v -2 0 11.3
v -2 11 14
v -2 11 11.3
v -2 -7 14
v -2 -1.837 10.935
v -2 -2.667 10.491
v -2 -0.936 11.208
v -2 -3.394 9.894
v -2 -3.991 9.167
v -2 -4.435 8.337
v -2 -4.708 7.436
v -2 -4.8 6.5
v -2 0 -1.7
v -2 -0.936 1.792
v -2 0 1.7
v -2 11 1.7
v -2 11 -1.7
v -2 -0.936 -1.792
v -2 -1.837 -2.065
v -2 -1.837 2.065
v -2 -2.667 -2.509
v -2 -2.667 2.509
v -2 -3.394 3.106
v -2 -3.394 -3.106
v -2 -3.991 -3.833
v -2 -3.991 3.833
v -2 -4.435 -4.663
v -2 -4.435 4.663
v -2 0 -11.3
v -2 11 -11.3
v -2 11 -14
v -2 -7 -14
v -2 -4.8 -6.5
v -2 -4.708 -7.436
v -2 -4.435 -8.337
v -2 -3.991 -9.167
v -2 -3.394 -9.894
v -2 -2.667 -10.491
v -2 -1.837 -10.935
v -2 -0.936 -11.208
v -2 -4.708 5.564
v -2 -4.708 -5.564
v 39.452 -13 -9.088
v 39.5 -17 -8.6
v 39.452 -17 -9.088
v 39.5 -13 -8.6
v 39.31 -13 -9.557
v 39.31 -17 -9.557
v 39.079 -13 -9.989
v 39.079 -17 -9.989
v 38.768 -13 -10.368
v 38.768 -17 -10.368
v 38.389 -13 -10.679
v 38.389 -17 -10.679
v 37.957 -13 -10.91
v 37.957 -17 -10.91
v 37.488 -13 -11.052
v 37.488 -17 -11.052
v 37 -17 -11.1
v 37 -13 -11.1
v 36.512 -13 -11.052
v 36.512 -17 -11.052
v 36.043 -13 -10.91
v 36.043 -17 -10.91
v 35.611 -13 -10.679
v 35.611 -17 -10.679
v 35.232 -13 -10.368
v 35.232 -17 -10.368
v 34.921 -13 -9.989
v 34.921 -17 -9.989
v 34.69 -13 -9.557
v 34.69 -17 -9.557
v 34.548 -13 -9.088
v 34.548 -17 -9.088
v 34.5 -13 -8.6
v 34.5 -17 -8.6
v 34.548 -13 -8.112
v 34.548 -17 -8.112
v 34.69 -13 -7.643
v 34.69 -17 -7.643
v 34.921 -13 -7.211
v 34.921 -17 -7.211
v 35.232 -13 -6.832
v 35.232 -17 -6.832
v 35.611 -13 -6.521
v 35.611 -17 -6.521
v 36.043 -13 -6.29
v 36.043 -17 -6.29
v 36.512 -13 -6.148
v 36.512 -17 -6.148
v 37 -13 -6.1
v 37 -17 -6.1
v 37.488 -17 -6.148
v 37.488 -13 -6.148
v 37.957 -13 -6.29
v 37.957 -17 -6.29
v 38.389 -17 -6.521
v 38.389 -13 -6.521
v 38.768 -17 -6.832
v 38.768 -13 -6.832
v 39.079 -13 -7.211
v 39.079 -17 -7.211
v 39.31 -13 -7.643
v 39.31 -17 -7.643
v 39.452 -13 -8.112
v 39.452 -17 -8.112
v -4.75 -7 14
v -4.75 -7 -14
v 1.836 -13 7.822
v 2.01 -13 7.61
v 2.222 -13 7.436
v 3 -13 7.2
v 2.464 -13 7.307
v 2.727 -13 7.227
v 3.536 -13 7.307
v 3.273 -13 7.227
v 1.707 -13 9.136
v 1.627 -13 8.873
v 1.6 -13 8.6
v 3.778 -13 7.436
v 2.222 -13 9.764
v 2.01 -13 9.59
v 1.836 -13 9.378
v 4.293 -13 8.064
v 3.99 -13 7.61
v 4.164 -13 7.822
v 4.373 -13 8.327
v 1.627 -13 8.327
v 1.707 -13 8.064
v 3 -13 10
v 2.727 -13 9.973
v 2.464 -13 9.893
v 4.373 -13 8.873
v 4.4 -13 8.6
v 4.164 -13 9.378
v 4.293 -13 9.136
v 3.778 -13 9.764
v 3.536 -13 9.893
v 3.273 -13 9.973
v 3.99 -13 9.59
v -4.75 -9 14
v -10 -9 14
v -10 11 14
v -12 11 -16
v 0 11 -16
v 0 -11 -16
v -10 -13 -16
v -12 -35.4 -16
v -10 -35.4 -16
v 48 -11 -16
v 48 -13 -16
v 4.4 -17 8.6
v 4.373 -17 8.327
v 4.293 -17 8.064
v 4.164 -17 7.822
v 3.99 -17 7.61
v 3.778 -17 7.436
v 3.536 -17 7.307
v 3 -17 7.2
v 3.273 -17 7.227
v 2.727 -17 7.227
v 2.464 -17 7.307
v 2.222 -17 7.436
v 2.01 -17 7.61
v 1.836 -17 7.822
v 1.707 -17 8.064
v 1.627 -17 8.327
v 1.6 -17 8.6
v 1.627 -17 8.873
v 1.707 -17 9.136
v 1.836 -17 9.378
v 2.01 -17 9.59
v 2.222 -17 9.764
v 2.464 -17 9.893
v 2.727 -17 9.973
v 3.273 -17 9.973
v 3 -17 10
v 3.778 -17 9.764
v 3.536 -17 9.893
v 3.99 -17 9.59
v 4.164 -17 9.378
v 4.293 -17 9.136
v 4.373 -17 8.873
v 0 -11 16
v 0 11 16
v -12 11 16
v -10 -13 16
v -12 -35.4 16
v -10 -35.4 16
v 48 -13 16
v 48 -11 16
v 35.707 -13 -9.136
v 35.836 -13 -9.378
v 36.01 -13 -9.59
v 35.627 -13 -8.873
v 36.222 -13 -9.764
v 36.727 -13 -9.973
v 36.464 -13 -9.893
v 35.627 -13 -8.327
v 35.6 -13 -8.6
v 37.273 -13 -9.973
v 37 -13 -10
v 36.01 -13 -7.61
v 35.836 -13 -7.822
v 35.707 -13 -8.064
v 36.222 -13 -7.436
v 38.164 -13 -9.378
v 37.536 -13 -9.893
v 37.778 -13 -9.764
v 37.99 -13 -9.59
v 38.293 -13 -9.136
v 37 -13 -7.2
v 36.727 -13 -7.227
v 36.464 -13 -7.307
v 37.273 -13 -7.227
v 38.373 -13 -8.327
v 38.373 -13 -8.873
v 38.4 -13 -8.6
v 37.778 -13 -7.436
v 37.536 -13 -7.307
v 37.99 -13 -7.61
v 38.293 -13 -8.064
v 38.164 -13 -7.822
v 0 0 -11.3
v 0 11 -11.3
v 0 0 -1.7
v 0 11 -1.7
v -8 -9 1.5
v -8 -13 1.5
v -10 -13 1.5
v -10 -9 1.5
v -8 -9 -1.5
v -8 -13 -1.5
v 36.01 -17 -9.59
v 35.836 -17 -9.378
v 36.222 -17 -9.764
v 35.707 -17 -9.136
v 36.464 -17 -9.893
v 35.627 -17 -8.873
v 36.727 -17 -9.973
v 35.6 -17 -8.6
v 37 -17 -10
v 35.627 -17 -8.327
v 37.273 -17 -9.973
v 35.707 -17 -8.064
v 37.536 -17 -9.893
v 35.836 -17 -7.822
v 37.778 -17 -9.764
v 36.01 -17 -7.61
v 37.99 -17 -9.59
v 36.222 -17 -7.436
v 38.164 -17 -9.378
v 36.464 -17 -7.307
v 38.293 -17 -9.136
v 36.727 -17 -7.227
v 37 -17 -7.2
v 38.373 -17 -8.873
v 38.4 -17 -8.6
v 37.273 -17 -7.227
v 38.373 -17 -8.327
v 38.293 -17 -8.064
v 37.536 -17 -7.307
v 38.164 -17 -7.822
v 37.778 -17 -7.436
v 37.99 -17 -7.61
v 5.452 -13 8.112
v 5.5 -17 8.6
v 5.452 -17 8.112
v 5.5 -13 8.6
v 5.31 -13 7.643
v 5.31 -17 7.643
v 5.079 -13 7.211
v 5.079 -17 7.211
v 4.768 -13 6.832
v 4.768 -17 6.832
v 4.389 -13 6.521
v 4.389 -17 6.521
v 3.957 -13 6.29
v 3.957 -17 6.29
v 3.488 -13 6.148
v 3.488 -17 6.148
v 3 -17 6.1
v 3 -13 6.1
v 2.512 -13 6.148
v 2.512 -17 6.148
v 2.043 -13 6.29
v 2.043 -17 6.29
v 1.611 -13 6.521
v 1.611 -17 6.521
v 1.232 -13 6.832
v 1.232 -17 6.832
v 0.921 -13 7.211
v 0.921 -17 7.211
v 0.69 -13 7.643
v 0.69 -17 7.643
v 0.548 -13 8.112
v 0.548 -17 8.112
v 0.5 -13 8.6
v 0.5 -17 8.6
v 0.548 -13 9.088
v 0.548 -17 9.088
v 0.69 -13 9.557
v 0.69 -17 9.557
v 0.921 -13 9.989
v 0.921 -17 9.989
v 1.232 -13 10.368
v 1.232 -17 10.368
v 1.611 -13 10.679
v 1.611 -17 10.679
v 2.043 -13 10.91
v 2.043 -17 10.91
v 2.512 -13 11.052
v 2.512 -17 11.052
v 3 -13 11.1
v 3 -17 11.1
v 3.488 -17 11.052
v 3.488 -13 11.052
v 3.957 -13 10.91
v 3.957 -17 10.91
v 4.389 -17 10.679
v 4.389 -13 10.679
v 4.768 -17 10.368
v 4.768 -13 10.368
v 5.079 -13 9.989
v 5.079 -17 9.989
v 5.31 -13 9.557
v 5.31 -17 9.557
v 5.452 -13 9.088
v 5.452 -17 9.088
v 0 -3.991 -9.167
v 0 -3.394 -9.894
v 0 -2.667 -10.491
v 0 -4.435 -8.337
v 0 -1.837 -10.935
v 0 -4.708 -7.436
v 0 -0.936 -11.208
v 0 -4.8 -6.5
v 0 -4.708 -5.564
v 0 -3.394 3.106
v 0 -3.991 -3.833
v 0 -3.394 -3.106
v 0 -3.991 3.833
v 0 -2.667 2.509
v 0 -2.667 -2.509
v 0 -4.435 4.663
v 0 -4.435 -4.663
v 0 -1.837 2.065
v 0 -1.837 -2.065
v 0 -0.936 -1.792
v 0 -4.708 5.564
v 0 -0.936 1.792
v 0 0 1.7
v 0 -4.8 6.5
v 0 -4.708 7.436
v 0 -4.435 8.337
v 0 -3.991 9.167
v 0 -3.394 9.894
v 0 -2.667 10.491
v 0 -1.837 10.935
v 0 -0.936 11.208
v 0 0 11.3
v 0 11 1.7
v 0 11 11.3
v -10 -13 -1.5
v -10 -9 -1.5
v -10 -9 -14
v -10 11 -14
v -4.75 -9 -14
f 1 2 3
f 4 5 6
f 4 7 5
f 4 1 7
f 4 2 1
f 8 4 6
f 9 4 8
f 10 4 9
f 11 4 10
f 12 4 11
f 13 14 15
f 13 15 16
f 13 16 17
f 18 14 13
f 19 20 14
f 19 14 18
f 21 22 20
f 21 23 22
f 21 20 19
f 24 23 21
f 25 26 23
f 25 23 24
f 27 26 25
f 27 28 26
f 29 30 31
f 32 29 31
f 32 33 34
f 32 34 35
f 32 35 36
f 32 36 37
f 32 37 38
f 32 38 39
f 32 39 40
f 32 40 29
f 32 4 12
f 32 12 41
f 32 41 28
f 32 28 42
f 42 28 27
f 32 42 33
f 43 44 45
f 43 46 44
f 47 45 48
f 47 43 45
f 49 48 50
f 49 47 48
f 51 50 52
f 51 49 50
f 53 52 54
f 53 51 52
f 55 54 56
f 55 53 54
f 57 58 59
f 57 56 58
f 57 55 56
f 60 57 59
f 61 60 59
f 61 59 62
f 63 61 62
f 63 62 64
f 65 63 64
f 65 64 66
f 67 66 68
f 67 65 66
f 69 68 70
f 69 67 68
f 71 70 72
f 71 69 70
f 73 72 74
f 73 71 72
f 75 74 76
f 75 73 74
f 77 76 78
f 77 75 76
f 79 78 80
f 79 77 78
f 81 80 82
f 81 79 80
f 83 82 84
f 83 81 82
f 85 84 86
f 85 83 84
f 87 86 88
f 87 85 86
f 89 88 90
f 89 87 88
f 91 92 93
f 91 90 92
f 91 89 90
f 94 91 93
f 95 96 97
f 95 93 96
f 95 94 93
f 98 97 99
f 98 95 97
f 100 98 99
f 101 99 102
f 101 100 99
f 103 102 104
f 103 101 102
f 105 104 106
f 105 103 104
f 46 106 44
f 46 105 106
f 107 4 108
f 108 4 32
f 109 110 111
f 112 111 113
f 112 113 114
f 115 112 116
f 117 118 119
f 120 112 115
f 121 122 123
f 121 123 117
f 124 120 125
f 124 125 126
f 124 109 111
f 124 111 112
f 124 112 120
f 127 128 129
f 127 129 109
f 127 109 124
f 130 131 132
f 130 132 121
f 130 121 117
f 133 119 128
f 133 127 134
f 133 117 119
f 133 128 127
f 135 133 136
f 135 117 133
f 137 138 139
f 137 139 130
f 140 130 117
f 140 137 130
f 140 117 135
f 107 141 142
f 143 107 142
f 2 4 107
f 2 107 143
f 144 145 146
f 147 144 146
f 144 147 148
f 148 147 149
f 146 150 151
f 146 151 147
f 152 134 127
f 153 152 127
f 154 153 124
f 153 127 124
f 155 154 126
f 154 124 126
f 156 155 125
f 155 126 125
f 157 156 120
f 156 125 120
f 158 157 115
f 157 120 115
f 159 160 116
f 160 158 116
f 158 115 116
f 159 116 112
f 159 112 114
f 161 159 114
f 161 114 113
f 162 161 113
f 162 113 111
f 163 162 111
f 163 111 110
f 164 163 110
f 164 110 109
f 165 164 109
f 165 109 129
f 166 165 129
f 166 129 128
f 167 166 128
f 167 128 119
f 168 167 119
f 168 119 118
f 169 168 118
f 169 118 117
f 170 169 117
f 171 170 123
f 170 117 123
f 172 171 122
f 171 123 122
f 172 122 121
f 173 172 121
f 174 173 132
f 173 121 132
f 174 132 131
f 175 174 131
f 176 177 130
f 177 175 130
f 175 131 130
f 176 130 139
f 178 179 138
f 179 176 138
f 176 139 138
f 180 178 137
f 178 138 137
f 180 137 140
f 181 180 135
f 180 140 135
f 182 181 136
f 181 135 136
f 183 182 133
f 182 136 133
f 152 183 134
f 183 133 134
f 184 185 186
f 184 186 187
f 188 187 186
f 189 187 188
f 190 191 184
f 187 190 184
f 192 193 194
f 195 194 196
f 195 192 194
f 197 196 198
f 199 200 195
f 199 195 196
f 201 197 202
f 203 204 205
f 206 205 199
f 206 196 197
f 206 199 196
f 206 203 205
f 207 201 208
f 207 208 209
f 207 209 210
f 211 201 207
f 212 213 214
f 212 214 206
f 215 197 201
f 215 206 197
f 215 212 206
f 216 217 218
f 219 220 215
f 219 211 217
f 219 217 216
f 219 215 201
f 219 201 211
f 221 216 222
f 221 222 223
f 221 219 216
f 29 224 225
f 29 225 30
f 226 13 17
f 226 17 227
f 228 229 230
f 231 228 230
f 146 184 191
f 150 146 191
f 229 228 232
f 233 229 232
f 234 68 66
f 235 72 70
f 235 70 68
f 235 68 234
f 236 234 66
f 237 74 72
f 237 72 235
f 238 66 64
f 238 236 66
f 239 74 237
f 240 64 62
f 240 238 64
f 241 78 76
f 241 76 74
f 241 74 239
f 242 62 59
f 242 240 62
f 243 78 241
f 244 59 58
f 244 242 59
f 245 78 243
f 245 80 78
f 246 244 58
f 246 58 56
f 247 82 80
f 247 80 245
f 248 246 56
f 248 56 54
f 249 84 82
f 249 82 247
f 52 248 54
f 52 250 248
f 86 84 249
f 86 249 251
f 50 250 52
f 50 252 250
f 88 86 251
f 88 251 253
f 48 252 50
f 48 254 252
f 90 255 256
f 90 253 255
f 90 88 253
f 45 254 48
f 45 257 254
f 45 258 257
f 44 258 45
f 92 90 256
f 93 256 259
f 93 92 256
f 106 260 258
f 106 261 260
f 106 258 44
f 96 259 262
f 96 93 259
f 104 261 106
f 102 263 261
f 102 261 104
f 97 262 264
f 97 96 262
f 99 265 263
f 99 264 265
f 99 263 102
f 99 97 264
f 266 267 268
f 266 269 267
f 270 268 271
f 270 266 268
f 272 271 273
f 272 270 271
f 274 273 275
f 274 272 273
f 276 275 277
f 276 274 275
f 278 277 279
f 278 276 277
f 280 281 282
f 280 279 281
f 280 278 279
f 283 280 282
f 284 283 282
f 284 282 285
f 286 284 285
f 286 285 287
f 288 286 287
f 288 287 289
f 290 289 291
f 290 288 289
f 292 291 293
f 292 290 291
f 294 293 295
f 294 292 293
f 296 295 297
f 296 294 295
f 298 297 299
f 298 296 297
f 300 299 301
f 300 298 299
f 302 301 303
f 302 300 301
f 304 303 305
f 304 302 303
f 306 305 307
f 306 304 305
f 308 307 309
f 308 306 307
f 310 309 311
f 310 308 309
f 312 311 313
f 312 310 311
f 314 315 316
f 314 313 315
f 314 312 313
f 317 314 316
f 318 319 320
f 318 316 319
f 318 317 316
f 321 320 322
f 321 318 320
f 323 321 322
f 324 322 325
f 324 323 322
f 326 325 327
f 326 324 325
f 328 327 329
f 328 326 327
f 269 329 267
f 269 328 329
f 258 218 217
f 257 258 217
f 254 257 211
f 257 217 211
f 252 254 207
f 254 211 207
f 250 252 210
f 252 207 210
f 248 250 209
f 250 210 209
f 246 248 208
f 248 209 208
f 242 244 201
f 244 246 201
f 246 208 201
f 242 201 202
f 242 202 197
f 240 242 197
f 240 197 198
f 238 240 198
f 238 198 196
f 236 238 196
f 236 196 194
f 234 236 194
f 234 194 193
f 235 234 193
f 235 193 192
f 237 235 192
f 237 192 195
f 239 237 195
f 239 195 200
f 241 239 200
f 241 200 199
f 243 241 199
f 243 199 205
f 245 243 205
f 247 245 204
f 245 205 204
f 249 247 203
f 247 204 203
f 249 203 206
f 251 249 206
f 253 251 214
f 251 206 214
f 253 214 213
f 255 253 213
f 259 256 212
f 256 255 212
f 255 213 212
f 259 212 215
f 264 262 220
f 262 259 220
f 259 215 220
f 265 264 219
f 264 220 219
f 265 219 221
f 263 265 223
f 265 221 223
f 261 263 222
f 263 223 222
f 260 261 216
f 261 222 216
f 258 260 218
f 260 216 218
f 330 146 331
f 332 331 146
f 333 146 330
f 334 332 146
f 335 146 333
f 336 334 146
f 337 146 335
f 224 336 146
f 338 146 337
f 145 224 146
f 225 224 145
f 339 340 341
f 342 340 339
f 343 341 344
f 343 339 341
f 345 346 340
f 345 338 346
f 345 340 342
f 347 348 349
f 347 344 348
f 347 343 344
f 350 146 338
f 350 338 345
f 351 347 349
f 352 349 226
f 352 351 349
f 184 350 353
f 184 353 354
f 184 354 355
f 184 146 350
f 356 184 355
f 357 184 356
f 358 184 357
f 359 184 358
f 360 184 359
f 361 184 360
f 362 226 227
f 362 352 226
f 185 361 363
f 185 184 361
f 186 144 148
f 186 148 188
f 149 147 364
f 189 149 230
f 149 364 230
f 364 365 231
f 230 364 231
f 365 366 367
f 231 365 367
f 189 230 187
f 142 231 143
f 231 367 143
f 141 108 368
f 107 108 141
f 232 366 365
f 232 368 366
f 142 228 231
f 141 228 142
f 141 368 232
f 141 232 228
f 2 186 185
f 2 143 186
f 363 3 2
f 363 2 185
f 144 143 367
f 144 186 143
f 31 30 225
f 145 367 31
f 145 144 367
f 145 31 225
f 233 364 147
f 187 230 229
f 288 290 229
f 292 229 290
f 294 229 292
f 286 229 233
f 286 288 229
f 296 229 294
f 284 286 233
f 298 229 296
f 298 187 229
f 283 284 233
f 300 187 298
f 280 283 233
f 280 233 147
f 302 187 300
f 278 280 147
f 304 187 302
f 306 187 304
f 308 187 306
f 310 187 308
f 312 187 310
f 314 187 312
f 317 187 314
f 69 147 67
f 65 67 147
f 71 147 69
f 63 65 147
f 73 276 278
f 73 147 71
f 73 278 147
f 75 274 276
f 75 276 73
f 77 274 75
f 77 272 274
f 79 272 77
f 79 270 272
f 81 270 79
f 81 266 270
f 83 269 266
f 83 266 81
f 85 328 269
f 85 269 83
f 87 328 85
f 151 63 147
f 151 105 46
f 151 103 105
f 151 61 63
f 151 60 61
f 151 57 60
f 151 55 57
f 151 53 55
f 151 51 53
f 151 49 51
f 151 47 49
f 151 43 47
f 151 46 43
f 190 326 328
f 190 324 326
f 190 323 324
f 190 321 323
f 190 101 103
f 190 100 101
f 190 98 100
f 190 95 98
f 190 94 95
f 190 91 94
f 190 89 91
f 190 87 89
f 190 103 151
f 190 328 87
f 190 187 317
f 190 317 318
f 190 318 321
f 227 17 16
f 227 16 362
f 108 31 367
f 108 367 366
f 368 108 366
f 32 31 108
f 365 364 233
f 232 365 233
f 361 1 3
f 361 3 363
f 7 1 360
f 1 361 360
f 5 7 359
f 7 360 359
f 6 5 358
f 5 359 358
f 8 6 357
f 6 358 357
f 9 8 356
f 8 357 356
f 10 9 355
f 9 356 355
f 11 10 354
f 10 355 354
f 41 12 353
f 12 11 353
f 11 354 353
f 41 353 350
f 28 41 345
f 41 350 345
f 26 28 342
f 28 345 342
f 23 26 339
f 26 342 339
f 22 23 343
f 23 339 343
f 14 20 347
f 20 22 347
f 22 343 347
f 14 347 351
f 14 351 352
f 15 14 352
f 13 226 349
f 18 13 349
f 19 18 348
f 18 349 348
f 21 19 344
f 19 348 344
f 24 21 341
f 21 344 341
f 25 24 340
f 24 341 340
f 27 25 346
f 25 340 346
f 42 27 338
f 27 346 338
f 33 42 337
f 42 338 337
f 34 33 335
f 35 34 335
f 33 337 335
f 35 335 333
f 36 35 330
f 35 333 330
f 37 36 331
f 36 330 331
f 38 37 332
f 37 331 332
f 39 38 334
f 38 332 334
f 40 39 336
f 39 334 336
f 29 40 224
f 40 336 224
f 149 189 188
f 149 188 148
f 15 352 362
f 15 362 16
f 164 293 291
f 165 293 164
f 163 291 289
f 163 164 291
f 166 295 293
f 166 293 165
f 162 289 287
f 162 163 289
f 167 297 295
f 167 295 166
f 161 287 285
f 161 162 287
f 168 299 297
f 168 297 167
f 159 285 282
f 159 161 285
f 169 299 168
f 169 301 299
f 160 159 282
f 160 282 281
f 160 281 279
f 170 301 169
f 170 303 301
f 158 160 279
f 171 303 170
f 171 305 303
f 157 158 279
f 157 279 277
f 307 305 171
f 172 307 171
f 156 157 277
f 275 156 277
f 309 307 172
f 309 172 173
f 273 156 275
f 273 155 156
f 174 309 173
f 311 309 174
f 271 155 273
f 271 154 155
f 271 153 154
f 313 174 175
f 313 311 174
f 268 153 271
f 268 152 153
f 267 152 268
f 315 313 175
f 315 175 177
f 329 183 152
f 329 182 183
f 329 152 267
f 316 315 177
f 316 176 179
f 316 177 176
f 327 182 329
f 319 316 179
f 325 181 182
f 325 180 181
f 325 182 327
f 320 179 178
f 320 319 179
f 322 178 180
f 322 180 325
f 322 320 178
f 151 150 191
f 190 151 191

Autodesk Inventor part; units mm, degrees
ref_plane "YZ Plane" through (0, 0, 0) normal (1, 0, 0) x (0, 1, 0)
ref_plane "XZ Plane" through (0, 0, 0) normal (0, 1, 0) x (-1, 0, 0)
ref_plane "XY Plane" through (0, 0, 0) normal (0, 0, 1) x (1, 0, 0)
sketch "Sketch2" plane through (0, 0, 0) normal (1, 0, 0) x (0, 1, 0)
  line L0 (11, -16) -> (-11, -16)
  line L1 (-11, -16) -> (-11, 16)
  line L2 (-11, 16) -> (11, 16)
  line L3 (11, 16) -> (11, -16)
  line L4 (11, -16) -> (-11, 16) construction
  line L5 (-11, -16) -> (11, 16) construction
  circle A0 centre (0, -6.5) radius 4.8
  circle A1 centre (0, 6.5) radius 4.8
  line L6 (0, 6.5) -> (0, 0)
  point P0 (0, 0)
  dimension "d8" = 22
  dimension "d9" = 32
  dimension "d14" = 9.6
  dimension "d15" = 13
  dimension "d23" = 6.5
  dimension "d24" = 9.6
  dimension "d25" = 13
extrude "Extrusion2" add sketch "Sketch2" against normal blind 10
shell "Shell1" thickness 2 removed faces 3 at (-10, 8.8868, -1.7838) at (-6.6667, 4.7378, -7.27) at (-6.6667, 4.7378, 5.73)
sketch "Sketch4" plane through (0, 0, 0) normal (0, 1, 0) x (-1, 0, 0)
  line L0 (2, -14) -> (2, 14) projected
  line L1 (2, 0) -> (4.75, 0) construction
  line L2 (4.75, -11.3497) -> (6.75, -11.3497)
  line L3 (6.75, -11.3497) -> (6.75, 11.3497)
  line L4 (6.75, 11.3497) -> (4.75, 11.3497)
  line L5 (4.75, 11.3497) -> (4.75, -11.3497)
  point P0 (0, 0)
  dimension "d19" = 2.75
  dimension "d20" = 2
extrude "Extrusion4" [suppressed]
sketch "Sketch5" plane through (0, -11, -16) normal (0, -1, 0) x (1, 0, 0)
  line L0 (-10, 2) -> (-10, 30) projected
  line L1 (-8, 17.5) -> (-10, 17.5)
  line L2 (-10, 17.5) -> (-10, 14.5)
  line L3 (-10, 14.5) -> (-8, 14.5)
  line L4 (-8, 14.5) -> (-8, 17.5)
  line L5 (-8, 17.5) -> (-10, 14.5) construction
  line L6 (-10, 17.5) -> (-8, 14.5) construction
  line L7 (-10, 0) -> (-10, 32) projected
  point P0 (0, 16)
  dimension "d27" = 3
  dimension "d30" = 2
extrude "Extrusion5" cut sketch "Sketch5" against normal blind 2
sketch "Sketch6" plane through (-2, -9, 14) normal (-1, 0, 0) x (0, 0, 1)
  line L0 (0, 18) -> (0, 0) projected
  line L1 (-28, 16) -> (0, 16)
  line L2 (0, 16) -> (0, 2)
  line L3 (0, 2) -> (-28, 2)
  line L4 (-28, 2) -> (-28, 16)
  line L5 (-28, 16) -> (0, 2) construction
  line L6 (0, 16) -> (-28, 2) construction
  line L7 (-28, 18) -> (0, 18)
  line L8 (0, 18) -> (0, 0)
  line L9 (0, 0) -> (-28, 0)
  line L10 (-28, 0) -> (-28, 18)
  line L11 (-28, 18) -> (0, 0) construction
  line L12 (0, 18) -> (-28, 0) construction
  point P0 (-14, 9)
  dimension "d31" = 14
extrude "Extrusion6" add sketch "Sketch6" along normal blind 2.75 contours L0 L1 L10 L7 | L0 L9 L10 L3
sketch "Sketch7" plane through (0, -11, -16) normal (0, -1, 0) x (1, 0, 0)
  circle A0 centre (37, 7.4) radius 2.5 projected
  circle A1 centre (3, 24.6) radius 2.5 projected
  line L0 (-10, 14.5) -> (-10, 0) projected
  line L1 (-10, 0) -> (48, 0) projected
  line L2 (48, 0) -> (48, 32) projected
  line L3 (48, 32) -> (-10, 32) projected
  line L4 (-10, 32) -> (-10, 17.5) projected
  line L5 (-10, 17.5) -> (-8, 17.5) projected
  line L6 (-8, 17.5) -> (-8, 14.5) projected
  line L7 (-8, 14.5) -> (-10, 14.5) projected
  line L8 (-6.75, 4.6503) -> (-6.75, 27.3497) projected
  line L9 (-6.75, 27.3497) -> (-4.75, 27.3497) projected
  line L10 (-4.75, 27.3497) -> (-4.75, 4.6503) projected
  line L11 (-4.75, 4.6503) -> (-6.75, 4.6503) projected
  line L12 (-10, 0) -> (-10, 32) projected
  point P0 (0, 16)
extrude "Extrusion7" add sketch "Sketch7" along normal blind 2 contours A0 | A1 | L7 L6 L5 L4 L3 L2 L1 L0 | L8 L9 L10 L11
sketch "Sketch8" plane through (-10, 0, 0) normal (-1, 0, 0) x (0, 0, 1)
  line L0 (16, 11) -> (-16, 11) projected
  line L1 (-16, 11) -> (-16, -35.4) projected
  line L2 (16, -35.4) -> (-16, -35.4) projected
  line L3 (16, 11) -> (16, -35.4) projected
  point P0 (0, 0)
extrude "Extrusion8" add sketch "Sketch8" along normal blind 2
sketch "Sketch9" plane through (0, -13, -16) normal (0, -1, 0) x (1, 0, 0)
  circle A0 centre (37, 7.4) radius 1.4 projected
  circle A1 centre (37, 7.4) radius 2.5 projected
  circle A2 centre (3, 24.6) radius 1.4 projected
  circle A3 centre (3, 24.6) radius 2.5 projected
  point P0 (0, 16)
extrude "Extrusion9" add sketch "Sketch9" along normal blind 4
sketch "Sketch10" plane through (0, 0, 0) normal (1, 0, 0) x (0, 0, -1)
  line L0 (-16, 11) -> (-16, -11) projected
  line L1 (-16, -11) -> (16, -11) projected
  line L2 (16, -11) -> (16, 11) projected
  line L3 (16, 11) -> (-16, 11) projected
  circle A0 centre (-6.5, 0) radius 4.8 projected
  circle A1 centre (6.5, 0) radius 4.8 projected
  line L4 (16, -11) -> (16, 11) projected
  line L5 (16, 0) -> (-16, 0)
  line L6 (-16, -35.4) -> (-16, 11) projected
  line L7 (-16, 11) -> (16, 11)
  line L8 (16, 11) -> (16, 0)
  line L9 (16, 0) -> (-16, 0)
  line L10 (-16, 0) -> (-16, 11)
  point P0 (0, 0)
  point P1 (11.3, 0)
  point P2 (-11.3, 0)
  point P3 (-1.7, 0)
  point P4 (1.7, 0)
extrude "Extrusion10" cut sketch "Sketch10" against normal blind 12 contours L3 L2 L5 A1 A0 L0 | A0 L5 | L5 A1 picked at (-5.9326, 1.496) picked at (7.6976, 1.061)
sketch "Sketch11" plane through (-8, -9, 1.5) normal (0, 1, 0) x (1, 0, 0)
  line L0 (1.45, 12.6493) -> (1.45, -9.6497) projected
  line L1 (3.05, 12.6493) -> (1.45, 12.6493) projected
  line L2 (1.45, -9.6497) -> (3.05, -9.6497) projected
  line L3 (1.45, 12.6493) -> (3.2385, 12.6493)
  line L4 (3.2385, 12.6493) -> (3.2385, -9.6497)
  line L5 (3.2385, -9.6497) -> (1.45, -9.6497)
  line L6 (1.45, -9.6497) -> (1.45, 12.6493)
  point P0 (8, 1.5)
extrude "Extrusion11" [suppressed]
sketch "Sketch12" plane through (0, 0, -11.3) normal (0, 1, 0) x (1, 0, 0)
  line L0 (-2, -9.6) -> (0, -9.6) projected
  line L1 (-2, -13) -> (-2, -9.6) projected
  line L2 (0, -13) -> (-2, -13) projected
  line L3 (0, -9.6) -> (0, -13) projected
  line L4 (0, 0) -> (-2, 0) projected
  line L5 (0, 4.7) -> (0, 0) projected
  line L6 (-12, 4.7) -> (0, 4.7) projected
  line L7 (-12, -27.3) -> (-12, 4.7) projected
  line L8 (0, -27.3) -> (-12, -27.3) projected
  line L9 (0, -22.6) -> (0, -27.3) projected
  line L10 (-2, -22.6) -> (0, -22.6) projected
  line L11 (-2, -25.3) -> (-2, -22.6) projected
  line L12 (-10, -25.3) -> (-2, -25.3) projected
  line L13 (-10, 2.7) -> (-10, -25.3) projected
  line L14 (-2, 2.7) -> (-10, 2.7) projected
  line L15 (-2, 0) -> (-2, 2.7) projected
  point P0 (0, -11.3)
extrude "Extrusion12" add sketch "Sketch12" along normal blind 11
properties part number "snapConnector_3DPrint"
